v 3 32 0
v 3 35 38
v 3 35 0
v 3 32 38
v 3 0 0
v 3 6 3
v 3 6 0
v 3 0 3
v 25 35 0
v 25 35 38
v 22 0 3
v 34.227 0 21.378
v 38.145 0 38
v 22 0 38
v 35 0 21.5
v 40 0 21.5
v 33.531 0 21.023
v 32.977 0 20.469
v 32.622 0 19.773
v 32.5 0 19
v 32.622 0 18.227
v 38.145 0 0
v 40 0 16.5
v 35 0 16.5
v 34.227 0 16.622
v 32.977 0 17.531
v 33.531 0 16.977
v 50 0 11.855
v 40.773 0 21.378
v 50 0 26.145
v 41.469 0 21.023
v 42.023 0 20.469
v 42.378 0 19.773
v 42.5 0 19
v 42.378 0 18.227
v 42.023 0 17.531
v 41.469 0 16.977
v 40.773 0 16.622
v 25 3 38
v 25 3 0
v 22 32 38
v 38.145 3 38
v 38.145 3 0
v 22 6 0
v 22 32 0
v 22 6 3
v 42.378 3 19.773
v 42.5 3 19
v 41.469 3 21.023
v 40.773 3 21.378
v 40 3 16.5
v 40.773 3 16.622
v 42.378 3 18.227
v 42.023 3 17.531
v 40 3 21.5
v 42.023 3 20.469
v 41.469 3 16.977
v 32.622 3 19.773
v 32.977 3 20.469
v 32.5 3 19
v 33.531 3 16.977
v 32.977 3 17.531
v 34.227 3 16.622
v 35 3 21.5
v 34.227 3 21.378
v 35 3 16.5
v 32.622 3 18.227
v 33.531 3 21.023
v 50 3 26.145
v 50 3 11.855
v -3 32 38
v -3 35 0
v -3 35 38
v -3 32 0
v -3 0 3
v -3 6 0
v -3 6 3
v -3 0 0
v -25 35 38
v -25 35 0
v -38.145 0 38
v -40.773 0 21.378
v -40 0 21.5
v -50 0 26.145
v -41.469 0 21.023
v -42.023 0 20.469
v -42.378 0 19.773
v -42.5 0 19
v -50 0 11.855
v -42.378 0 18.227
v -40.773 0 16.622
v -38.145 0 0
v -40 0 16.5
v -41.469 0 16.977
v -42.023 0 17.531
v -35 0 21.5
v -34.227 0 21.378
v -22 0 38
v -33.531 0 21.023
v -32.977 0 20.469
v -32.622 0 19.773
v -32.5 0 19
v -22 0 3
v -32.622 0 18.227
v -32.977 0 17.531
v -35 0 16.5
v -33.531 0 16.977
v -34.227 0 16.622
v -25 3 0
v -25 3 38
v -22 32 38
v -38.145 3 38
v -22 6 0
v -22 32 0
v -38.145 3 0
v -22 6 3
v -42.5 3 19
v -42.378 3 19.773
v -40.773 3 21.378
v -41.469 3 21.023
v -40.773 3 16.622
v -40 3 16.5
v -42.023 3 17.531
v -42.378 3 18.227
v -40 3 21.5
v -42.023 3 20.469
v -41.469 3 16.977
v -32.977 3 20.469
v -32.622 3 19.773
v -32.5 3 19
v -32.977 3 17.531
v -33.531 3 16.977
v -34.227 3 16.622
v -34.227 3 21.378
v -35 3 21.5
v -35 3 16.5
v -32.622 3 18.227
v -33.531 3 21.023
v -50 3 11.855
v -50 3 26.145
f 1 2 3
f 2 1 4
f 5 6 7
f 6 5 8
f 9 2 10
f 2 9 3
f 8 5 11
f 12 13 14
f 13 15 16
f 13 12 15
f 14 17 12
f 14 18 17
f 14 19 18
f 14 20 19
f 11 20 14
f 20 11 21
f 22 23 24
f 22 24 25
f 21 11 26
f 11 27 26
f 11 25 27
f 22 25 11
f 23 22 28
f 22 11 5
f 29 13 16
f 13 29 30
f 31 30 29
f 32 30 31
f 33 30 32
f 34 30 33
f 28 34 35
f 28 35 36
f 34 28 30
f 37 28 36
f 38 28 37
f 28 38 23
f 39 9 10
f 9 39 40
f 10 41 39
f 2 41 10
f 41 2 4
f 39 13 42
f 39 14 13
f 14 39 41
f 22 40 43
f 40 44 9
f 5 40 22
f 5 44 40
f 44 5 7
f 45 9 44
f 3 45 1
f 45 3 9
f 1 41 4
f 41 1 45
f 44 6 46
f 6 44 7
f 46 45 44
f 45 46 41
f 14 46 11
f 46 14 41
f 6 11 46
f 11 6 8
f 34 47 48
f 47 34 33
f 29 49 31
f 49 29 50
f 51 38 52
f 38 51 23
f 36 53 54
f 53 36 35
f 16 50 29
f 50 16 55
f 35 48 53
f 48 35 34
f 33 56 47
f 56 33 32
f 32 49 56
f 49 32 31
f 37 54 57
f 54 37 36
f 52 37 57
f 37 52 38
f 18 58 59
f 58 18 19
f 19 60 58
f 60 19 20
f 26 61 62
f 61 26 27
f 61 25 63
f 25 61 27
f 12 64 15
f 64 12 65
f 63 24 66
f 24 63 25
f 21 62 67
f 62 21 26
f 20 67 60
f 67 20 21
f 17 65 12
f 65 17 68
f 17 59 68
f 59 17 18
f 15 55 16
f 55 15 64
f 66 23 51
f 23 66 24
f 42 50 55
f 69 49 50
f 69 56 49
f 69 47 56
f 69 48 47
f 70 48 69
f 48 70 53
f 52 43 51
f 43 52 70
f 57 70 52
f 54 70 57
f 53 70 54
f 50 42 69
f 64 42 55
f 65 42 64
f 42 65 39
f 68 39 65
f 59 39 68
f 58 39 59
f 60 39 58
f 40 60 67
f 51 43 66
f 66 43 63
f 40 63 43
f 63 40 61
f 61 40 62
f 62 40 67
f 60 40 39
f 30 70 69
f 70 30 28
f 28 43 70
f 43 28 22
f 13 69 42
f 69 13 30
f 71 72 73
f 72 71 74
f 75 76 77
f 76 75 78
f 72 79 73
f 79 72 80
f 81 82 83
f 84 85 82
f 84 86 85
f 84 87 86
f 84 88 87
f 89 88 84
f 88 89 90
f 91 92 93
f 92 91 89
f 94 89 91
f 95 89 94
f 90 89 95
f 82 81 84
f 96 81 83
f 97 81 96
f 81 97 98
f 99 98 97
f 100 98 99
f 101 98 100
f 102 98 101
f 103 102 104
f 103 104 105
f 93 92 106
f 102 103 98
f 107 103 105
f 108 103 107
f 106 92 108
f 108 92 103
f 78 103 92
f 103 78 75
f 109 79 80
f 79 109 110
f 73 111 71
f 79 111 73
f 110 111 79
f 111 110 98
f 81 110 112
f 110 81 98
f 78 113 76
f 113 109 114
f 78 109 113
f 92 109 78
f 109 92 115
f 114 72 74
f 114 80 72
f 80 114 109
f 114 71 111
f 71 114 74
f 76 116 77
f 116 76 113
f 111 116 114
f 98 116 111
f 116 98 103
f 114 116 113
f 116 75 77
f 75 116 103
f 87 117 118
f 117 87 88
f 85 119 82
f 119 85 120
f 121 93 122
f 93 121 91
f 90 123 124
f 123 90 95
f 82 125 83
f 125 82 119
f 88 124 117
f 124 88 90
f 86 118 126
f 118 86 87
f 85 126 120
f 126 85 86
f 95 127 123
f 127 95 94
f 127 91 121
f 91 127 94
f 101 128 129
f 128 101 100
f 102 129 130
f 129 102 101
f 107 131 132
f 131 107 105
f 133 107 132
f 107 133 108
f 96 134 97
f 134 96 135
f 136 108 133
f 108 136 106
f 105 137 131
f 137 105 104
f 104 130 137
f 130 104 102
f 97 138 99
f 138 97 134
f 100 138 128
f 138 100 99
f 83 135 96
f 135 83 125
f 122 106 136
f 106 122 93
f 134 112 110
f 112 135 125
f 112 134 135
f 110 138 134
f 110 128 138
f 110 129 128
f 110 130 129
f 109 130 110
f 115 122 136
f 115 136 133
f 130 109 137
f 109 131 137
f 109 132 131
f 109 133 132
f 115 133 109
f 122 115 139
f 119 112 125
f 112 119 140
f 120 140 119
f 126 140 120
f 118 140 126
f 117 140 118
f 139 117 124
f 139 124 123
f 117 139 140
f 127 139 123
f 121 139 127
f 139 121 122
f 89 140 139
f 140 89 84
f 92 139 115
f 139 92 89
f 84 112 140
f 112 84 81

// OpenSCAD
//
//  Variable size box retainer for mounting
//  on a wall.
//
//  The main intention of this Thing is
//  to provide mounting for a Linksys Hub
//
//	  R. Lazure, February 16, 2014
//
//
//  ------------------------
//  inputs
//
/* [Box] */

//  Holding a box with a height of ...
box_ht = 32;  // [10:50]
//  Bottom of the holder has a block height of
block_ht= 6; // [0:45]
//  Top of the holder has a tab 
top_tab= 0;  // [0:45]
//  Side of the holder has a tab
side_tab = 0; // [0:30]
//  Length of the holder
length= 38; // [20:100]
//	 Holder width
box_wd = 19; // [10:50]
//
/* [Holding tab] */
//  Width of the tab that holds the screw
tab_width = 25;  // [15:75]
//  screw diameter
screw_dia=5; // [3:15]
//  center to center play in slot
slot_sp=5; // [0:15]
//  wall thickness  
thickness = 3; // [2:5]

/* [Hidden] */
$fn=20;
//
//   -------------------------
//		Module:  Housing
//	  -------------------------
//
module housing() {
difference()
	{
	difference ()
	{
//  outer block
	cube([thickness+box_wd,length,box_ht+thickness]);
	translate([thickness+side_tab,0,block_ht]) cube([box_wd+2, length+2,box_ht-block_ht-top_tab]);
	}
translate ([thickness,thickness,0]) cube([box_wd,length,box_ht]);
	}
}
//
//   -------------------------
//		Module:  tab
//	  -------------------------
// 
module tab() {
//
difference() {
// bottom plate
translate ([-tab_width,0,0]) cube([tab_width,length,thickness]);
//
//  slot position
translate([-tab_width/2-slot_sp/2,length/2,0])
//   slot
union(){
translate([0,0,-1])
cylinder(h=thickness+2,r=screw_dia/2);
translate([slot_sp,0,-1])
cylinder(h=thickness+2,r=screw_dia/2);
translate([0,-screw_dia/2,-1])
cube([slot_sp,screw_dia,thickness+2]);
		}
	}
}
//
//		-------------------
//		Module: box holder
//		-------------------
//
module box_holder() {
housing();
difference() {
difference() {
tab();
//     chamfer 1
// create a large cube rotated 45 degrees to cut the corner
translate([-tab_width-2.5,-tab_width+4,-1])
rotate([0,0,45])
cube([tab_width,tab_width,thickness+2]);
             }
//		 chamfer 2
// create a large cube rotated 45 degrees to cut the corner
translate([-tab_width*1.9,length+1,-1])
rotate([0,0,-45])
cube([tab_width,tab_width,thickness+2]);
              }
}
//		-------------
//   			Main
//		-------------
//
//  for Thingiverse Customizer
//  two clamps are made

//   rotate for proper orientation
//  in MakerWare for slicing
//
rotate([90,0,180]) {
//	  original clamp
translate([-box_wd-thickness-3,0,0])
box_holder();
//   mirror copy of the same clamp
mirror([1,0,0])
translate([-box_wd-thickness-3,0,0])
box_holder();
				}
